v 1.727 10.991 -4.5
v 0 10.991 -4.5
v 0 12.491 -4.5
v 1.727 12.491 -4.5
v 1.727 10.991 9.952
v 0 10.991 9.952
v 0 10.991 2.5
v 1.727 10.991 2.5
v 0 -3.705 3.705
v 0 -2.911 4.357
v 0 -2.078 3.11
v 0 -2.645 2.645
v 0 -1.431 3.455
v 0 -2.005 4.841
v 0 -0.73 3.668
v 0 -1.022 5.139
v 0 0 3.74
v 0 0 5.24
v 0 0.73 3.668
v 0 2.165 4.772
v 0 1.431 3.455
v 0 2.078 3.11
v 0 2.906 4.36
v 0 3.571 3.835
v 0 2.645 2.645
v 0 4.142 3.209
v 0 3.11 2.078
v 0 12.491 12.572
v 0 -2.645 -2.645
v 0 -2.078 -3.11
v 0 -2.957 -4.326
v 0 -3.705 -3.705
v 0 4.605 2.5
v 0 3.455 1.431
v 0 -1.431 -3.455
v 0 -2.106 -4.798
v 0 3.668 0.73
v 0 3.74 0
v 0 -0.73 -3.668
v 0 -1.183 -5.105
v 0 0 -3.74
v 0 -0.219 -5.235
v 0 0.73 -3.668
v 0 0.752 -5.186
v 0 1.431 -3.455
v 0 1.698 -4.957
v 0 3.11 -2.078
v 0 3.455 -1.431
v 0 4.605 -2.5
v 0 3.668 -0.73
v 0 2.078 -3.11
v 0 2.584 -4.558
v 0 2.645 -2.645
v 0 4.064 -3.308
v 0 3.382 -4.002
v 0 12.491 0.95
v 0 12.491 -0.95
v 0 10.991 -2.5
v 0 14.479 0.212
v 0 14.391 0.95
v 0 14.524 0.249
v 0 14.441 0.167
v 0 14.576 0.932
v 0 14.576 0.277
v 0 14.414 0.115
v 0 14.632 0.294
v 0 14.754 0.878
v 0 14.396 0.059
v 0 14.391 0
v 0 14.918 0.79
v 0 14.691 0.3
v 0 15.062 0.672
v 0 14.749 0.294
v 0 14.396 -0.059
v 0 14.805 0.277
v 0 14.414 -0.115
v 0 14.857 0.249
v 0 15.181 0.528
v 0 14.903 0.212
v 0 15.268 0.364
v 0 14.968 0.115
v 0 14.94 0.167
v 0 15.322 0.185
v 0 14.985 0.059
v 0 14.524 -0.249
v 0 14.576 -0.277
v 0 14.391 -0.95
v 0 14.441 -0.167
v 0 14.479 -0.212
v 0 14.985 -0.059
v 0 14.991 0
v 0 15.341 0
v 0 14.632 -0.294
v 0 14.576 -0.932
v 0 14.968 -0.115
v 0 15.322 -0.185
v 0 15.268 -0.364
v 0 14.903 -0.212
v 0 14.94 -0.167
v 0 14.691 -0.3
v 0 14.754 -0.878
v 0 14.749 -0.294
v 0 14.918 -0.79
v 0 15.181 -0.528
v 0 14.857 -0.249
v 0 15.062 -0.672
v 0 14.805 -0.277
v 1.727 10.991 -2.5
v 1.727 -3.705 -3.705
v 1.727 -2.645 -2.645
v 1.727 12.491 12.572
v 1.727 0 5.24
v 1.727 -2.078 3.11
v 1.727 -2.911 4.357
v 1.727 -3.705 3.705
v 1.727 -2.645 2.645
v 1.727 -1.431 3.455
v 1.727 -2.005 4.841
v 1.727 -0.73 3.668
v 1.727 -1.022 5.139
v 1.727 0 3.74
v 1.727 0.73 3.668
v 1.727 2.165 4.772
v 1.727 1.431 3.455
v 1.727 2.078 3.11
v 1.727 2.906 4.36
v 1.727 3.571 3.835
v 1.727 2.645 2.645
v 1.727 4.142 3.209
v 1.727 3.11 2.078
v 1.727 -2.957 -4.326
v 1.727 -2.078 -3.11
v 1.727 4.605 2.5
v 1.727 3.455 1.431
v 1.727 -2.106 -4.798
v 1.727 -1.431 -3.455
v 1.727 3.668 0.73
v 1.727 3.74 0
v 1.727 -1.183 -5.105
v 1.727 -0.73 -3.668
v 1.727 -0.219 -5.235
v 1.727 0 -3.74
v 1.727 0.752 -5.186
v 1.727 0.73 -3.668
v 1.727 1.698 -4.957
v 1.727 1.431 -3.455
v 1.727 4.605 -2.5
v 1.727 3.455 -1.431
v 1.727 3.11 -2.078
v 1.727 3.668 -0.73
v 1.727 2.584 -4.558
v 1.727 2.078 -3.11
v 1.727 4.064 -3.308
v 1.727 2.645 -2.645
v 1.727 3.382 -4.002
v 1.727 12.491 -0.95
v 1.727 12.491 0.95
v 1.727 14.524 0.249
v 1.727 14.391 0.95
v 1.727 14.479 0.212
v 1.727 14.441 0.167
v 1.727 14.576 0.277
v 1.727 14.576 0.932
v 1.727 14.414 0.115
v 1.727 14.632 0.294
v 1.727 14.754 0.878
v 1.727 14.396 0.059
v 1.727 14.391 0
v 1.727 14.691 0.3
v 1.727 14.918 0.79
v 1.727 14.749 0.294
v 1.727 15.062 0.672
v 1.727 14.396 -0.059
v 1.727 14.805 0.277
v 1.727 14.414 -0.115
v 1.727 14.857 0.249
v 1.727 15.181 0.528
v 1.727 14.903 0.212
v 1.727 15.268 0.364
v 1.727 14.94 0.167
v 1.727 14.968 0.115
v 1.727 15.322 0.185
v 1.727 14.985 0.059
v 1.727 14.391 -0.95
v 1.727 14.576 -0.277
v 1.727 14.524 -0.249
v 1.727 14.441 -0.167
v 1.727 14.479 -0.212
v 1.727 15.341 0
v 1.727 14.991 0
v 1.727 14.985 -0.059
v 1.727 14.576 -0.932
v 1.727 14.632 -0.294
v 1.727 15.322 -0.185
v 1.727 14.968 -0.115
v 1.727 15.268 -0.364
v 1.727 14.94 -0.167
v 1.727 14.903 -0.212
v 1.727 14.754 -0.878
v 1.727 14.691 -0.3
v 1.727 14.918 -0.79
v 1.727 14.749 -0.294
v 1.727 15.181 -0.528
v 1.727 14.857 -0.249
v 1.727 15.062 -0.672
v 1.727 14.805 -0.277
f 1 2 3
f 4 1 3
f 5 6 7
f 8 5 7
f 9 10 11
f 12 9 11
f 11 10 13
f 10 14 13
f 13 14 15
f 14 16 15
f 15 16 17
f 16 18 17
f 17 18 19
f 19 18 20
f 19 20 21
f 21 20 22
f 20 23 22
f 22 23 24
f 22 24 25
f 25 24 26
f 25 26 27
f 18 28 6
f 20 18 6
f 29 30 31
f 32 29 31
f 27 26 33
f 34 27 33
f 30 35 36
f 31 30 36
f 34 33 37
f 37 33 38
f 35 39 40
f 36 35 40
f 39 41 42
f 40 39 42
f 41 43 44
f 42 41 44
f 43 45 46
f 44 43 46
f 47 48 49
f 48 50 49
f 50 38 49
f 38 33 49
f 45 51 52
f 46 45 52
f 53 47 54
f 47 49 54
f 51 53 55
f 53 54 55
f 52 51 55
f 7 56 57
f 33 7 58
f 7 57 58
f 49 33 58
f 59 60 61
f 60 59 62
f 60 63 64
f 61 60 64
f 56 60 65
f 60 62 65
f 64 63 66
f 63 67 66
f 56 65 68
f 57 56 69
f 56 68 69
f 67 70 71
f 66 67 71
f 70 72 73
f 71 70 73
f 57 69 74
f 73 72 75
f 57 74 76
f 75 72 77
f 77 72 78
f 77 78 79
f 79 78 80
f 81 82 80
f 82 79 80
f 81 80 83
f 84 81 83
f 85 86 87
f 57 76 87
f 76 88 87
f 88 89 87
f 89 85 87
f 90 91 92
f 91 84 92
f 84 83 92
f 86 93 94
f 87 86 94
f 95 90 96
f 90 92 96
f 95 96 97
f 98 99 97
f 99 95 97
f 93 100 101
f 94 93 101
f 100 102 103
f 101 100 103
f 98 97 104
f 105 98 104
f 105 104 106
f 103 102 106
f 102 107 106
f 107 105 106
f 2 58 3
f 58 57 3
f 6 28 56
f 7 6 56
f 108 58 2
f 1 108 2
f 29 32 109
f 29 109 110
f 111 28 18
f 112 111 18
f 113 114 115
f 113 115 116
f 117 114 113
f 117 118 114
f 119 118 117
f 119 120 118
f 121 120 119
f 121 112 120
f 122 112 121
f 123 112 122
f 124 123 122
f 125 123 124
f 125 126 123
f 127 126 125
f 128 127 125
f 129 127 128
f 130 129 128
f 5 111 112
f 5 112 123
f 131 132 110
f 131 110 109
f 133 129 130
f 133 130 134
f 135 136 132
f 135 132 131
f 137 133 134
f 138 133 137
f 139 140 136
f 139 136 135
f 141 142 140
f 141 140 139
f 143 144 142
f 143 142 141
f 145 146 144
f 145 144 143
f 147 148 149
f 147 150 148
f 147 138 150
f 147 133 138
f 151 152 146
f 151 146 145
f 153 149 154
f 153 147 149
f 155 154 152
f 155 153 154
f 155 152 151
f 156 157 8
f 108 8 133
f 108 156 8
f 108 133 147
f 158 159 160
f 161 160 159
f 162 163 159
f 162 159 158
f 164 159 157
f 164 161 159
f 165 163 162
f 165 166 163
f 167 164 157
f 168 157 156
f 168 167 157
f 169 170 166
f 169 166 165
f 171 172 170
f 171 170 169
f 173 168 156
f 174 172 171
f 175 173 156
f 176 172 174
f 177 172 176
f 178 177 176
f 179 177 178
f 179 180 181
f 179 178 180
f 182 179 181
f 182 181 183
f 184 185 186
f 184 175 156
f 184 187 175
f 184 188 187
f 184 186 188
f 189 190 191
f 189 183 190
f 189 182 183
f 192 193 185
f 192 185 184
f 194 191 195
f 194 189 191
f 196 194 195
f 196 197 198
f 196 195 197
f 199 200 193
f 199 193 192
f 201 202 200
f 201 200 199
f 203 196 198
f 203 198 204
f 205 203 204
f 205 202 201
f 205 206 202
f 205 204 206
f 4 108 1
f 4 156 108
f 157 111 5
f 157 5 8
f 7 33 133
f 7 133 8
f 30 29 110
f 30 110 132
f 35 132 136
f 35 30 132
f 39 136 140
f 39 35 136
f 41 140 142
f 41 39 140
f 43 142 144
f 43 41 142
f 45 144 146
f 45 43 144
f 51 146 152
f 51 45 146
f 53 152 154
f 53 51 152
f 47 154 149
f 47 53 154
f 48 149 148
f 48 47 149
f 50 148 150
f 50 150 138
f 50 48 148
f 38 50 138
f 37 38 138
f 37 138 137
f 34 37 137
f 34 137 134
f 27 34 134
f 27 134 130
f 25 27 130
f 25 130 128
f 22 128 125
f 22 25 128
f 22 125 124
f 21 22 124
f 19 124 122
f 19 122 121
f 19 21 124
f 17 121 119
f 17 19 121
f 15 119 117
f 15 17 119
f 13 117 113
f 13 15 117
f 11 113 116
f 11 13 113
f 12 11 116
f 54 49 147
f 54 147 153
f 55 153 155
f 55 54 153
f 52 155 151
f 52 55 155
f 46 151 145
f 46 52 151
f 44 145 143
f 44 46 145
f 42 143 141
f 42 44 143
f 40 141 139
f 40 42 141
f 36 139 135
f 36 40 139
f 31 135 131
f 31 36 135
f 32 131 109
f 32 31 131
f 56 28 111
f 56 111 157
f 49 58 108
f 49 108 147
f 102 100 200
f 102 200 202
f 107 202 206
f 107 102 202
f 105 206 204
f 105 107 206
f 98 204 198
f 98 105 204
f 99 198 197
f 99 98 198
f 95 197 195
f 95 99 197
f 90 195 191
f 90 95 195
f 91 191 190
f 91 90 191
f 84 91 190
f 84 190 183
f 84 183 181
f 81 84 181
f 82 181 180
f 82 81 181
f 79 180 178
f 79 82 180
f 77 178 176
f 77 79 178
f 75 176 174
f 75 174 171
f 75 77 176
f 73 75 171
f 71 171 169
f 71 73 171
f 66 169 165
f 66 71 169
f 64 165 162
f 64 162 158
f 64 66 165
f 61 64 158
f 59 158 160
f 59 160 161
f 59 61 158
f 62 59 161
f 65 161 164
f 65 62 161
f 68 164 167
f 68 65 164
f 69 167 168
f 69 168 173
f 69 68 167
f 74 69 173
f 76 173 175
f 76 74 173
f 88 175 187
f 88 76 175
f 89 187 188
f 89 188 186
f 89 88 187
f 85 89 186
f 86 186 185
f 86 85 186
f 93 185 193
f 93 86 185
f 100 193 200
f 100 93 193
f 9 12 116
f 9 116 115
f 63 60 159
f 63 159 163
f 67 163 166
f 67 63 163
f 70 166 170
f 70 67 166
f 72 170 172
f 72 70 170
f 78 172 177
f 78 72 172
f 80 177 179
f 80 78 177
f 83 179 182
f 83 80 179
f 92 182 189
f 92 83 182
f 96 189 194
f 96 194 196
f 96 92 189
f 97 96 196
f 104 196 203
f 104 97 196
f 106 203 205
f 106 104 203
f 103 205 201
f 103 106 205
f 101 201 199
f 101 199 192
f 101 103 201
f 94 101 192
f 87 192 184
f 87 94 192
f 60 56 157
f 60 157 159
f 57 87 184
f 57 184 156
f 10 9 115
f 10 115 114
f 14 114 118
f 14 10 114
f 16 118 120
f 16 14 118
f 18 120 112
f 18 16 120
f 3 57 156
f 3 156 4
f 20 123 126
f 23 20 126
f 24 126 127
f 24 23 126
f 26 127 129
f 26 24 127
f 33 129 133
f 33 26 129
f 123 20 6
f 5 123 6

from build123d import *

# Parameters (mm, degrees)
SKETCH1_R           = 0.3
SKETCH1_W           = 2
SKETCH1_H           = 1.5
BOSS_EXTRUDE1_DEPTH = 1.7272


with BuildPart() as part:
    # Sketch1 → Boss-Extrude1 (new body)
    # profile 1 of 3: a face of its own
    with BuildSketch(Plane(origin=(0, 0, 0), x_dir=(0, 0, -1), z_dir=(1, 0, 0))):
        with BuildLine():
            ThreePointArc((-0.95, 14.390683939), (0, 15.340683939), (0.95, 14.390683939))
            Line((0.95, 14.390683939), (0.95, 12.490683939))
            Line((0.95, 12.490683939), (2.5, 12.490683939))
            Line((2.5, 12.490683939), (2.5, 4.605171007))
            ThreePointArc((2.5, 4.605171007), (5.185747801, 0.752076956), (3.705239533, -3.705239533))
            Line((3.705239533, -3.705239533), (2.644579362, -2.644579362))
            ThreePointArc((2.644579362, -2.644579362), (0, 3.74), (-2.644579362, -2.644579362))
            Line((-2.644579362, -2.644579362), (-3.705239533, -3.705239533))
            ThreePointArc((-3.705239533, -3.705239533), (-5.185747801, 0.752076956), (-2.5, 4.605171007))
            Line((-2.5, 4.605171007), (-2.5, 12.490683939))
            Line((-2.5, 12.490683939), (-0.95, 12.490683939))
            Line((-0.95, 12.490683939), (-0.95, 14.390683939))
        make_face()
        with Locations((0, 14.690683939)):
            Circle(SKETCH1_R, mode=Mode.SUBTRACT)
    # profile 2 of 3: a face of its own
    with BuildSketch(Plane(origin=(0, 0, 0), x_dir=(0, 0, -1), z_dir=(1, 0, 0))):
        with BuildLine():
            Line((-12.571622028, 12.490683939), (-5.24, 0))
            ThreePointArc((-5.24, 0), (-5.121580996, 1.107703977), (-4.771676297, 2.165341847))
            Line((-4.771676297, 2.165341847), (-9.951862811, 10.990683939))
            Line((-9.951862811, 10.990683939), (-2.5, 10.990683939))
            Line((-2.5, 10.990683939), (-2.5, 12.490683939))
            Line((-2.5, 12.490683939), (-12.571622028, 12.490683939))
        make_face()
    # profile 3 of 3: a face of its own
    with BuildSketch(Plane(origin=(0, 0, 0), x_dir=(0, 0, -1), z_dir=(1, 0, 0))):
        with Locations((3.5, 11.740683939)):
            Rectangle(SKETCH1_W, SKETCH1_H)
    extrude(amount=BOSS_EXTRUDE1_DEPTH)


solid = part.part
